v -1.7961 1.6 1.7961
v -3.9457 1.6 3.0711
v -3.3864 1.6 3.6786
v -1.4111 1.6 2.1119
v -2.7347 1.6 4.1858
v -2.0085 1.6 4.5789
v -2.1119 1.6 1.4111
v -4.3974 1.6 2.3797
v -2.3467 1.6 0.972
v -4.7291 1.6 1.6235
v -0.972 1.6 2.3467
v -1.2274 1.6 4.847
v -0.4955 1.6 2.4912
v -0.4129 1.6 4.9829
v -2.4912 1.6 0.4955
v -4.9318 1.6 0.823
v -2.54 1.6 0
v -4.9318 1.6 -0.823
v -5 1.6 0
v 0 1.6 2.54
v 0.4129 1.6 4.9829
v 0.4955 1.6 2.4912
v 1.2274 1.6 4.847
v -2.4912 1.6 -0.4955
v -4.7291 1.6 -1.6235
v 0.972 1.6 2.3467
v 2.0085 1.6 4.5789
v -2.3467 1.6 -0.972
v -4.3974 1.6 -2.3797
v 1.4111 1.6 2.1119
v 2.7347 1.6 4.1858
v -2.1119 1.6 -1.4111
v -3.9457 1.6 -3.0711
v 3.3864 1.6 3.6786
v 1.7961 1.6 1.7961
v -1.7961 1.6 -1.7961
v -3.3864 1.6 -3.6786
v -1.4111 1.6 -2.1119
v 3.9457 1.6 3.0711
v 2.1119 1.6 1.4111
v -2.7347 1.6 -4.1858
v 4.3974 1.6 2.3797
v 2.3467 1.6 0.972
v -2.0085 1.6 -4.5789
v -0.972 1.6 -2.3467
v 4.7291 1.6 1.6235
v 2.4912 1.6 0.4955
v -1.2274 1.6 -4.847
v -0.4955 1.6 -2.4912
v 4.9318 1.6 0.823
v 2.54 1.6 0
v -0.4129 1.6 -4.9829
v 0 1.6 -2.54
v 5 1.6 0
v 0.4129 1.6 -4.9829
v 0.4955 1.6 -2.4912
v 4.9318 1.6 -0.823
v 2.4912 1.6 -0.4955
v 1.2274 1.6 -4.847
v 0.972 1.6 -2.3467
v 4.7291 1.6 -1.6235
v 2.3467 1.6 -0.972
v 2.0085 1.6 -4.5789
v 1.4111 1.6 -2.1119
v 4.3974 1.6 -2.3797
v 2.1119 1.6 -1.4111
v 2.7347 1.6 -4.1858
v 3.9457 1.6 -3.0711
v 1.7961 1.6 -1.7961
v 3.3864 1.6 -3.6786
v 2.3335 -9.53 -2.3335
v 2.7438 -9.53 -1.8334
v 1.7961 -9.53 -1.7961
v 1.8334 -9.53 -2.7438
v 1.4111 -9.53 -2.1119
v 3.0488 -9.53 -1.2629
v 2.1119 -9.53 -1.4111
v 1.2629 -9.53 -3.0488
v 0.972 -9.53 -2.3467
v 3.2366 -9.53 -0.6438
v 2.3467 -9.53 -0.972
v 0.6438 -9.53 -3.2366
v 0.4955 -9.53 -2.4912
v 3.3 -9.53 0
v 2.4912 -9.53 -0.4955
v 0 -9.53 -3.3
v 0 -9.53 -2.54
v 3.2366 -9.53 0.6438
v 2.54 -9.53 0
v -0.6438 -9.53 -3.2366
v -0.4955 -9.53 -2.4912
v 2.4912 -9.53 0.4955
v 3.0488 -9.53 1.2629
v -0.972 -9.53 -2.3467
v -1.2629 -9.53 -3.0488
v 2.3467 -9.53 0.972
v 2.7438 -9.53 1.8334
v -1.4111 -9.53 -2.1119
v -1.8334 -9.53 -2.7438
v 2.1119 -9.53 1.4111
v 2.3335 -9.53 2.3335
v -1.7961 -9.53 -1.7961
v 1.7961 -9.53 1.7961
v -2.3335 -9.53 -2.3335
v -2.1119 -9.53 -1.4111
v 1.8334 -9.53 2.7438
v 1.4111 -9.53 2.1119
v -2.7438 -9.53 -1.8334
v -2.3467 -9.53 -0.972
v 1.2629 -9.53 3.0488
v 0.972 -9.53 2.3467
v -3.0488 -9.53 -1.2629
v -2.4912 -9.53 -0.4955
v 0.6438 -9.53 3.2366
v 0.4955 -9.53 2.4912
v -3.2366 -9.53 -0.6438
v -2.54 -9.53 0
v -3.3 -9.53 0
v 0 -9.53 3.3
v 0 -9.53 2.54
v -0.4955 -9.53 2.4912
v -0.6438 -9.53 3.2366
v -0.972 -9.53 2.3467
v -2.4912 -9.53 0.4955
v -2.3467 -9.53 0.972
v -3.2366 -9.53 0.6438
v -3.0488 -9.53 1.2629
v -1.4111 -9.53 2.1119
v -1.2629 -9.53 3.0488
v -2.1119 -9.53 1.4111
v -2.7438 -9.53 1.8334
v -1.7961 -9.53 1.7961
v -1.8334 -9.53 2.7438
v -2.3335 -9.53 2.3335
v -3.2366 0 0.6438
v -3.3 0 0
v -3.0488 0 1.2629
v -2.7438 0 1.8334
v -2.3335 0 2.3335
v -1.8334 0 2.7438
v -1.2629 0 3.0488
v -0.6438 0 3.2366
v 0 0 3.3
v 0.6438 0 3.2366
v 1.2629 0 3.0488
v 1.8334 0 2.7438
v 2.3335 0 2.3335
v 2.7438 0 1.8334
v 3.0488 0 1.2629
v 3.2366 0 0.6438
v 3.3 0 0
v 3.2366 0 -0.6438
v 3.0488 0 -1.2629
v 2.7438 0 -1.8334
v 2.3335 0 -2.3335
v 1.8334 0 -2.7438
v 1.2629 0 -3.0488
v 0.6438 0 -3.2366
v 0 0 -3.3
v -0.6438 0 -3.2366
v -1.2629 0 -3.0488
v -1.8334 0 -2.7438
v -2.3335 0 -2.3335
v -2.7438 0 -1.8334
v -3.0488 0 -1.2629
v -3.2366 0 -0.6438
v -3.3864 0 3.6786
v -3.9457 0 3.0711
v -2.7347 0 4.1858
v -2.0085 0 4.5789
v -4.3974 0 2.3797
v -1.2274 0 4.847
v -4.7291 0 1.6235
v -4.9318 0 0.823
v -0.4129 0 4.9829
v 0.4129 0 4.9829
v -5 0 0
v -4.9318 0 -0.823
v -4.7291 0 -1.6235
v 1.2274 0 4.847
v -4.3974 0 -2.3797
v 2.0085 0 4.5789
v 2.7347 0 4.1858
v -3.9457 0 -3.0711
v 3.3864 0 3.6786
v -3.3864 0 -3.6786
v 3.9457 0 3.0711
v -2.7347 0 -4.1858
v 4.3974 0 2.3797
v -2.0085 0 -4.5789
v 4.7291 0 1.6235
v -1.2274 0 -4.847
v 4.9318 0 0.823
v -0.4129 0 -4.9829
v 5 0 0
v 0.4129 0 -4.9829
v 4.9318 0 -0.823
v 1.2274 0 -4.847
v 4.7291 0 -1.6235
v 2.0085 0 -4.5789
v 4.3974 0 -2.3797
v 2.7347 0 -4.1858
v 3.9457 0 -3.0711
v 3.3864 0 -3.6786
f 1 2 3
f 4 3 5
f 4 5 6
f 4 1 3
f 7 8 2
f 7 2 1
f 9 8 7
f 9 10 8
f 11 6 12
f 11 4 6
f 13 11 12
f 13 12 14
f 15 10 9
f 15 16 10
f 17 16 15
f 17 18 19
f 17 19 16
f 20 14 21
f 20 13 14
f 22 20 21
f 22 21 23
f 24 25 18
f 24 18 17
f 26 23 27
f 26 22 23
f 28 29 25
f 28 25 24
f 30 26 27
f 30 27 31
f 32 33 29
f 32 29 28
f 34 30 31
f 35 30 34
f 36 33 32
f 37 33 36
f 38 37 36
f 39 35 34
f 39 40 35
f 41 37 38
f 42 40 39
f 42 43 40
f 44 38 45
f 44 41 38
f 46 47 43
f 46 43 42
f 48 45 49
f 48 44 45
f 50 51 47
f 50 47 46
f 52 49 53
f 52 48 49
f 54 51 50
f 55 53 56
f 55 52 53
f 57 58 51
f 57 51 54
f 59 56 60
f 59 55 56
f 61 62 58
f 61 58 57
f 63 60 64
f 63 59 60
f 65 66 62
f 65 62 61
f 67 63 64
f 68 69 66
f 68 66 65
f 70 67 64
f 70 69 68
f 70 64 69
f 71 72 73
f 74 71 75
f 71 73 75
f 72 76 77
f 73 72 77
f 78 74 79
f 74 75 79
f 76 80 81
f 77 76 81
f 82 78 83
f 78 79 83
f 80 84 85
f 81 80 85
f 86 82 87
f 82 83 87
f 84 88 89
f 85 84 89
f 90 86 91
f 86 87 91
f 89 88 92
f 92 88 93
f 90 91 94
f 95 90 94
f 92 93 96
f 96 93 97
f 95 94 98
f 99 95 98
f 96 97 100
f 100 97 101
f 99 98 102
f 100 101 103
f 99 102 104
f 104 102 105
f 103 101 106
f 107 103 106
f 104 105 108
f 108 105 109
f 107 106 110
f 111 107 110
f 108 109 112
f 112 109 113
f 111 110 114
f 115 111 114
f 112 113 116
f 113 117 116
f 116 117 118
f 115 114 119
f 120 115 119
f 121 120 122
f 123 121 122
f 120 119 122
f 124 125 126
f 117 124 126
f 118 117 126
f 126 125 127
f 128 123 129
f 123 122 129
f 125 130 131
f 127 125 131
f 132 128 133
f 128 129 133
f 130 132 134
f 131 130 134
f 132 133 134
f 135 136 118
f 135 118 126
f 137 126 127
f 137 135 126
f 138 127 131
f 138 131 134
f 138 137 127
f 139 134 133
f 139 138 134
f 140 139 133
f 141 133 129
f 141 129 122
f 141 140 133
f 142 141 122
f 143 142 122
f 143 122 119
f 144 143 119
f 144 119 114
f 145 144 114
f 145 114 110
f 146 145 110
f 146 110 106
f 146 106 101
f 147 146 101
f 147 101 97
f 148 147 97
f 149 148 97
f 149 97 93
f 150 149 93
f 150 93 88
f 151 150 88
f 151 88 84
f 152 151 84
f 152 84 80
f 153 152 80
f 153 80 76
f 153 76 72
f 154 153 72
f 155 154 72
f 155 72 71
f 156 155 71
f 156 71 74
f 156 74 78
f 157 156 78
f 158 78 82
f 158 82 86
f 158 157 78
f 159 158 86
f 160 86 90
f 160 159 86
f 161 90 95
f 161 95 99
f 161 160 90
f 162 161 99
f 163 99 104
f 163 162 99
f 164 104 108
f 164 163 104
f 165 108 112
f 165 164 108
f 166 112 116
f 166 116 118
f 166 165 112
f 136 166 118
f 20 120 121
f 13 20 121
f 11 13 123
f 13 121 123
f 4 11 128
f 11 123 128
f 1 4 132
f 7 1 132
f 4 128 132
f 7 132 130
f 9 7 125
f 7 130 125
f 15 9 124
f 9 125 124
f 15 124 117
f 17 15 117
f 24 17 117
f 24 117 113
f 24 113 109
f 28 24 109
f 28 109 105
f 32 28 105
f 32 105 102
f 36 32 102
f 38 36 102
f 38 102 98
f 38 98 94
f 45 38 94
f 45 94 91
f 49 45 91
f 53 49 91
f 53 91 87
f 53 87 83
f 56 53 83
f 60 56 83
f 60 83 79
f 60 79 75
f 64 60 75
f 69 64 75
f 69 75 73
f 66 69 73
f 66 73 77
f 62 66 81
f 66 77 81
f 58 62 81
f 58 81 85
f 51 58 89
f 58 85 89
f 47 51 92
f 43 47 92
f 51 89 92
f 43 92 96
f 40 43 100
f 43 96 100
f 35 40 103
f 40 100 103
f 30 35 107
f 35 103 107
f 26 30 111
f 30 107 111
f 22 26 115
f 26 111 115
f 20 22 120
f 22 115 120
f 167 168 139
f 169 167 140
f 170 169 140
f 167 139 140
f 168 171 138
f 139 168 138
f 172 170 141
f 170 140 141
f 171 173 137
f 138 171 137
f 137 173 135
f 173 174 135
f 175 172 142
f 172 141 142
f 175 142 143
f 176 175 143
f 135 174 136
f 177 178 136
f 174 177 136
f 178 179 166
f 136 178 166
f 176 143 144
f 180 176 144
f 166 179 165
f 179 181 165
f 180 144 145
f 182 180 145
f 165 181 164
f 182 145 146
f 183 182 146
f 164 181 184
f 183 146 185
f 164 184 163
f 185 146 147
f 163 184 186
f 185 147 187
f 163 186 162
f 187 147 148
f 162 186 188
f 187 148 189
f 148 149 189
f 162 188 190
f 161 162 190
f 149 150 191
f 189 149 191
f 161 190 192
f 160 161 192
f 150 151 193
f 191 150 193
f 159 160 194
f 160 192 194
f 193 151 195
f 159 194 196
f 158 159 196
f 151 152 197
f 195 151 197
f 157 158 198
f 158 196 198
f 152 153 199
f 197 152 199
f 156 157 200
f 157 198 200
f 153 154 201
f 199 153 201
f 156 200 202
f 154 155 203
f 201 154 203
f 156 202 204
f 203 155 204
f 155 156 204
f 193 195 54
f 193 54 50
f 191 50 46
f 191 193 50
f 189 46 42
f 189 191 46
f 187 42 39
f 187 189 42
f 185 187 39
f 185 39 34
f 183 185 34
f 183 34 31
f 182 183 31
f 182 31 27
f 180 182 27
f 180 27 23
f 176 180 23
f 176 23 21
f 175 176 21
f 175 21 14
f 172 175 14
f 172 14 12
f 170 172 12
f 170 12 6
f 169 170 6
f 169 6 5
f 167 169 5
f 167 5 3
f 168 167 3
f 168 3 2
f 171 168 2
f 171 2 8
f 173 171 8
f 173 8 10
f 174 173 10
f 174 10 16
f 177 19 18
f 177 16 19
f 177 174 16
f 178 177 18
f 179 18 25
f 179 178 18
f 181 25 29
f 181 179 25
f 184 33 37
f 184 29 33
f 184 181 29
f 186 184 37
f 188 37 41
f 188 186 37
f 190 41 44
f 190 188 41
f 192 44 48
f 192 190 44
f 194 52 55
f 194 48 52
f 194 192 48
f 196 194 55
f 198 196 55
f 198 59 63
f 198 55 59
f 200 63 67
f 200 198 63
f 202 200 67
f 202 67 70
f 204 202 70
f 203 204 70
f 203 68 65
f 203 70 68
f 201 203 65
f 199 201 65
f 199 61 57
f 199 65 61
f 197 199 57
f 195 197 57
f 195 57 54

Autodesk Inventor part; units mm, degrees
ref_plane "YZ Plane" through (0, 0, 0) normal (1, 0, 0) x (0, 1, 0)
ref_plane "XZ Plane" through (0, 0, 0) normal (0, 1, 0) x (-1, 0, 0)
ref_plane "XY Plane" through (0, 0, 0) normal (0, 0, 1) x (1, 0, 0)
sketch "Washer Cross Section" plane through (0, 0, 0) normal (0, 1, 0) x (-1, 0, 0)
  circle A0 centre (0, 0) radius 3.3
  dimension "d0" = 6.6
extrude "Washer" add sketch "Washer Cross Section" against normal blind 9.53
sketch "Shoulder Cross Section" plane through (0, 0, 0) normal (0, 1, 0) x (1, 0, 0)
  circle A0 centre (0, 0) radius 5
  dimension "d3" = 10
extrude "Shoulder" add sketch "Shoulder Cross Section" along normal blind 1.6
sketch "Screw Hole Position" plane through (0, 1.6, 0) normal (0, 1, 0) x (1, 0, 0)
  point P0 (0, 0)
  point P1 (0, 0)
hole "Screw Hole" at (0, 1.6, 0) direction (0, -1, 0) diameter 5.08 end through all
properties part number "HSHW-M5-6.6-N" material "Nylon 6/6"
